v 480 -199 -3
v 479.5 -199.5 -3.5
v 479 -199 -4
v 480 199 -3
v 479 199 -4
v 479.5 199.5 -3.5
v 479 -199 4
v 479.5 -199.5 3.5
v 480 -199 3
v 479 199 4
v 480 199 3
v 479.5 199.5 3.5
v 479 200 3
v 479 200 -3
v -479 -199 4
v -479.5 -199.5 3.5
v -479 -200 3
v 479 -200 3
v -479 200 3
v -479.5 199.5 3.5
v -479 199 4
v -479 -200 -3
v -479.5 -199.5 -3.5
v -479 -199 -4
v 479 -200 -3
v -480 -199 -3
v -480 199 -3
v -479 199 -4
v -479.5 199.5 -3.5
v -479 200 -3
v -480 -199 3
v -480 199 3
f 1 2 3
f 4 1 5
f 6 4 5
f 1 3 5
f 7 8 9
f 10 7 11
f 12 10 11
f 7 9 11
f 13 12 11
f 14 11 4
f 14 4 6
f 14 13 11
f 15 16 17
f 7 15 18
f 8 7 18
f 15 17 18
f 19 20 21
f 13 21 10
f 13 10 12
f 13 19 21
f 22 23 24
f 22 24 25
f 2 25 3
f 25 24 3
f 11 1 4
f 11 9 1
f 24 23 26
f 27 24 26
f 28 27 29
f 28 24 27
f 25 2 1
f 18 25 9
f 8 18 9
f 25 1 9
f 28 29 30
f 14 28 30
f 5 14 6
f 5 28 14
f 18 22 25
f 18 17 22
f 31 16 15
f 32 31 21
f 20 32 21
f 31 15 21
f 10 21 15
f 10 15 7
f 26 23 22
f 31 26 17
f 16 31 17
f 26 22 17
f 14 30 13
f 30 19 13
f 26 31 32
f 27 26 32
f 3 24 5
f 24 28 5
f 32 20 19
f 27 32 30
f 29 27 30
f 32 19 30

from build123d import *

# Parameters (mm, degrees)
F0_W     = 960
F0_H     = 400
F1_DEPTH = 4
F2_SIZE  = 1
F3_SIZE  = 1
F4_SIZE  = 1
F5_SIZE  = 1
F6_SIZE  = 1
F7_SIZE  = 1
F8_SIZE  = 1
F9_SIZE  = 1
F10_SIZE = 1


with BuildPart() as f1:
    # F0 (on Top) → F1 (new body, symmetric)
    with BuildSketch(Plane.XY):
        Rectangle(F0_W, F0_H)
    extrude(amount=F1_DEPTH, both=True)

    # F2
    f2_edges = [f1.edges().sort_by_distance(p)[0] for p in [
        (0, -200, 4),
    ]]
    chamfer(f2_edges, length=F2_SIZE)

    # F3
    f3_edges = [f1.edges().sort_by_distance(p)[0] for p in [
        (480, 0.5, 4),
    ]]
    chamfer(f3_edges, length=F3_SIZE)

    # F4
    f4_edges = [f1.edges().sort_by_distance(p)[0] for p in [
        (-0.5, 200, 4),
    ]]
    chamfer(f4_edges, length=F4_SIZE)

    # F5
    f5_edges = [f1.edges().sort_by_distance(p)[0] for p in [
        (0, -200, -4),
        (-480, 0, -4),
        (0, 200, -4),
        (480, 0, -4),
    ]]
    chamfer(f5_edges, length=F5_SIZE)

    # F6
    f6_edges = [f1.edges().sort_by_distance(p)[0] for p in [
        (-480, 0, 4),
    ]]
    chamfer(f6_edges, length=F6_SIZE)

    # F7
    f7_edges = [f1.edges().sort_by_distance(p)[0] for p in [
        (-480, 200, 0),
    ]]
    chamfer(f7_edges, length=F7_SIZE)

    # F8
    f8_edges = [f1.edges().sort_by_distance(p)[0] for p in [
        (-480, -200, 0),
    ]]
    chamfer(f8_edges, length=F8_SIZE)

    # F9
    f9_edges = [f1.edges().sort_by_distance(p)[0] for p in [
        (480, -200, 0),
    ]]
    chamfer(f9_edges, length=F9_SIZE)

    # F10
    f10_edges = [f1.edges().sort_by_distance(p)[0] for p in [
        (480, 200, 0),
    ]]
    chamfer(f10_edges, length=F10_SIZE)


solid = f1.part
